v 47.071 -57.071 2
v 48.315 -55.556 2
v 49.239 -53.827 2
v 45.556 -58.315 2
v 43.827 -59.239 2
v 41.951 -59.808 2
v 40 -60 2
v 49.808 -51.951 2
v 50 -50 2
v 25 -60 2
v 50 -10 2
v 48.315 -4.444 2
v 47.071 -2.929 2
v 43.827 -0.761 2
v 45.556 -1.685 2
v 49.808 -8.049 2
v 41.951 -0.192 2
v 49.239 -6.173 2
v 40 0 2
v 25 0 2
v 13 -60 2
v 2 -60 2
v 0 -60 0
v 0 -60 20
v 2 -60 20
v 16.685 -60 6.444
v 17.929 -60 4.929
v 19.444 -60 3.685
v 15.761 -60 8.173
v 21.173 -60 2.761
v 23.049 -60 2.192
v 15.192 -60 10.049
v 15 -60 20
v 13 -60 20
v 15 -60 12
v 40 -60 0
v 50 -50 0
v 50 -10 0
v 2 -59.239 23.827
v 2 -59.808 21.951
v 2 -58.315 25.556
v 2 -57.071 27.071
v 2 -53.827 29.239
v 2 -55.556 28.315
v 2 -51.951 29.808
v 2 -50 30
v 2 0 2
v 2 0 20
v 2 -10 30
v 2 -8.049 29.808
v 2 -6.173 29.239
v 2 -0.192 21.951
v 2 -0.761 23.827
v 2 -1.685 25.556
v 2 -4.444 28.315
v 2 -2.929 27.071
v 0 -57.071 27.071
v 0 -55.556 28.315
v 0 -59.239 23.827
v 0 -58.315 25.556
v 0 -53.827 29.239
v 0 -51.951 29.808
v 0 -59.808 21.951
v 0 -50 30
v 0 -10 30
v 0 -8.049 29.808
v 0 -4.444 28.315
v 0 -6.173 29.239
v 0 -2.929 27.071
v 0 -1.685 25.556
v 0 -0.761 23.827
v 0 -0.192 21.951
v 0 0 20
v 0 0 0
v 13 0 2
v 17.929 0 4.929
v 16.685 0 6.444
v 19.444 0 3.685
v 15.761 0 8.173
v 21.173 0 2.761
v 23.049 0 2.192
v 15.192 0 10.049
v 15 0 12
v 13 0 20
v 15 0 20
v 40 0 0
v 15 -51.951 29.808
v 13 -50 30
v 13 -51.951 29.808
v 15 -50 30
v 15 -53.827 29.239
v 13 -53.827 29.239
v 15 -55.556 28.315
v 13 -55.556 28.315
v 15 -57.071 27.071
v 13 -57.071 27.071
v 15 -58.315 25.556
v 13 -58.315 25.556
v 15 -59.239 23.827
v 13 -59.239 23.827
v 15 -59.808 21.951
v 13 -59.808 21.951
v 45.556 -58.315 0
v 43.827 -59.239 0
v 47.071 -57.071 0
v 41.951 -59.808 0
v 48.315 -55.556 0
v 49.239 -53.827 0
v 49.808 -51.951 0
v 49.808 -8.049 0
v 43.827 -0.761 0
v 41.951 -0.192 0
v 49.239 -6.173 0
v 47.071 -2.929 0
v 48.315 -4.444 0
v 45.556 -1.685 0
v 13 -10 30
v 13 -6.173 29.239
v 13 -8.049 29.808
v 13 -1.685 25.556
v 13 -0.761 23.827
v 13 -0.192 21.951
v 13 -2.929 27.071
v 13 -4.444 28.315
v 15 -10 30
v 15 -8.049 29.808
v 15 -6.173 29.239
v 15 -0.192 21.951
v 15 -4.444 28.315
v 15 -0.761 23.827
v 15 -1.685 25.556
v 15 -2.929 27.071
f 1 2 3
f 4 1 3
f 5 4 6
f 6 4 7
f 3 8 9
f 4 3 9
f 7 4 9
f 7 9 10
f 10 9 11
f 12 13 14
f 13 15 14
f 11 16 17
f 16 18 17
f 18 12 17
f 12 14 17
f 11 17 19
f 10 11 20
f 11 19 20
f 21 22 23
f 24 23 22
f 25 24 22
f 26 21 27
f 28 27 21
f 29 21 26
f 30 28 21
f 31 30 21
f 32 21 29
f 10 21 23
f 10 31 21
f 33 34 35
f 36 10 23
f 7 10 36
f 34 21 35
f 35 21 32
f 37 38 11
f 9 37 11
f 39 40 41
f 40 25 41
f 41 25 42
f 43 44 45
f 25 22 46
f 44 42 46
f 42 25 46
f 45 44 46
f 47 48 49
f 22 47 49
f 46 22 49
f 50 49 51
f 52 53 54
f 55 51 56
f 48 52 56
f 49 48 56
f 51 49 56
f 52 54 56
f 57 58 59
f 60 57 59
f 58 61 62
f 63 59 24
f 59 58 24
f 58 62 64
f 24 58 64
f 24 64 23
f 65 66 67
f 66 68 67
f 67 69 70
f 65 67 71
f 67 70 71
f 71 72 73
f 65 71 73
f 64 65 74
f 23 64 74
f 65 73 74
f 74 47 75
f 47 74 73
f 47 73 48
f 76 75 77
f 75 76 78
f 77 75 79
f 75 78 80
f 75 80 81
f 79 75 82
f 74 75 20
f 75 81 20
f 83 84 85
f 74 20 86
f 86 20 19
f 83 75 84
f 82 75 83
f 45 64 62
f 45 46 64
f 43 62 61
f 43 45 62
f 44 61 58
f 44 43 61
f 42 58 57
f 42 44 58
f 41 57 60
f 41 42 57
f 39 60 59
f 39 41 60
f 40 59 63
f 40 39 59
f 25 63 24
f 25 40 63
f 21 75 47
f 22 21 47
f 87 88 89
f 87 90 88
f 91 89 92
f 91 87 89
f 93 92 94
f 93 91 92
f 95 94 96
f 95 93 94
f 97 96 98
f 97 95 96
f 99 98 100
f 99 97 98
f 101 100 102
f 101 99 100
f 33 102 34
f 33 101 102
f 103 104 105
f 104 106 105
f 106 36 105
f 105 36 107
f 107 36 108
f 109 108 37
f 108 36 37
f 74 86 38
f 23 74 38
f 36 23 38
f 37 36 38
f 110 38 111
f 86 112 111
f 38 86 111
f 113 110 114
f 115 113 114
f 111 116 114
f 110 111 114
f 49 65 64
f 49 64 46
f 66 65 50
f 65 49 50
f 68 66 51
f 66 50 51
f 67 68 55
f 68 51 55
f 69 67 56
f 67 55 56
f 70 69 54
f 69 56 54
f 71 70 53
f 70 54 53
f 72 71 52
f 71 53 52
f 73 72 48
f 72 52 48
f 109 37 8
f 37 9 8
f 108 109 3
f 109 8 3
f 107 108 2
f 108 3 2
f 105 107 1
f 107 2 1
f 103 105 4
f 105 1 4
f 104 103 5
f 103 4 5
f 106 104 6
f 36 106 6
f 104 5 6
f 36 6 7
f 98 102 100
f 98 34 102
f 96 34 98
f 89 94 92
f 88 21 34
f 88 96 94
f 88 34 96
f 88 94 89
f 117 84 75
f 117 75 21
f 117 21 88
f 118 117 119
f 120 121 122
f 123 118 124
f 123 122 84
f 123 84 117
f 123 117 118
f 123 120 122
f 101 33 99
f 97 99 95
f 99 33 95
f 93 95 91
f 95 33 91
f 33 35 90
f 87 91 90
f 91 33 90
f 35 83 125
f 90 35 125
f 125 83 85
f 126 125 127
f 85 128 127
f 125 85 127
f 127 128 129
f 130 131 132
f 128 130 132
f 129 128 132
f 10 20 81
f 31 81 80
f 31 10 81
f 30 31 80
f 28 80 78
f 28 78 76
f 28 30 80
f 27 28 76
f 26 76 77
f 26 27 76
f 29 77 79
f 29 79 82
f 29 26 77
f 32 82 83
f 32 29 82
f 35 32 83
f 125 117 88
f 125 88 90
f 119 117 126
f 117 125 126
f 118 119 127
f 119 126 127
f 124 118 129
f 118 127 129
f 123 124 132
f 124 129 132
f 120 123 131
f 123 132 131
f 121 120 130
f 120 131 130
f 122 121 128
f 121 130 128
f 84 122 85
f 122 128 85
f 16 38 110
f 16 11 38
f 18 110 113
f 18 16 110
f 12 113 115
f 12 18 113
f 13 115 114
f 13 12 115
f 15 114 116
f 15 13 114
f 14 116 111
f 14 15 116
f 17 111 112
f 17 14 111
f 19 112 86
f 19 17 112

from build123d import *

# Parameters (mm, degrees)
F0_W     = 2
F0_H     = 2
F0_W_2   = 11
F0_H_2   = 28
F0_W_3   = 35
F1_DEPTH = 60
F2_R     = 10


with BuildPart() as f1:
    # F0 (on Front) → F1 (new body)
    with BuildSketch(Plane.XZ):
        with Locations((1, 1)):
            Rectangle(F0_W, F0_H)
        with Locations((7.5, 1)):
            Rectangle(F0_W_2, F0_H)
        with Locations((1, 16)):
            Rectangle(F0_W, F0_H_2)
        with Locations((14, 1)):
            Rectangle(F0_W, F0_H)
        with Locations((32.5, 1)):
            Rectangle(F0_W_3, F0_H)
        with Locations((14, 16)):
            Rectangle(F0_W, F0_H_2)
    extrude(amount=F1_DEPTH)

    # F2
    f2_edges = [f1.edges().sort_by_distance(p)[0] for p in [
        (14, -60, 30),
        (1, -60, 30),
        (14, 0, 30),
        (1, 0, 30),
        (15, -30, 2),
        (50, 0, 1),
        (50, -60, 1),
    ]]
    fillet(f2_edges, radius=F2_R)


solid = f1.part
